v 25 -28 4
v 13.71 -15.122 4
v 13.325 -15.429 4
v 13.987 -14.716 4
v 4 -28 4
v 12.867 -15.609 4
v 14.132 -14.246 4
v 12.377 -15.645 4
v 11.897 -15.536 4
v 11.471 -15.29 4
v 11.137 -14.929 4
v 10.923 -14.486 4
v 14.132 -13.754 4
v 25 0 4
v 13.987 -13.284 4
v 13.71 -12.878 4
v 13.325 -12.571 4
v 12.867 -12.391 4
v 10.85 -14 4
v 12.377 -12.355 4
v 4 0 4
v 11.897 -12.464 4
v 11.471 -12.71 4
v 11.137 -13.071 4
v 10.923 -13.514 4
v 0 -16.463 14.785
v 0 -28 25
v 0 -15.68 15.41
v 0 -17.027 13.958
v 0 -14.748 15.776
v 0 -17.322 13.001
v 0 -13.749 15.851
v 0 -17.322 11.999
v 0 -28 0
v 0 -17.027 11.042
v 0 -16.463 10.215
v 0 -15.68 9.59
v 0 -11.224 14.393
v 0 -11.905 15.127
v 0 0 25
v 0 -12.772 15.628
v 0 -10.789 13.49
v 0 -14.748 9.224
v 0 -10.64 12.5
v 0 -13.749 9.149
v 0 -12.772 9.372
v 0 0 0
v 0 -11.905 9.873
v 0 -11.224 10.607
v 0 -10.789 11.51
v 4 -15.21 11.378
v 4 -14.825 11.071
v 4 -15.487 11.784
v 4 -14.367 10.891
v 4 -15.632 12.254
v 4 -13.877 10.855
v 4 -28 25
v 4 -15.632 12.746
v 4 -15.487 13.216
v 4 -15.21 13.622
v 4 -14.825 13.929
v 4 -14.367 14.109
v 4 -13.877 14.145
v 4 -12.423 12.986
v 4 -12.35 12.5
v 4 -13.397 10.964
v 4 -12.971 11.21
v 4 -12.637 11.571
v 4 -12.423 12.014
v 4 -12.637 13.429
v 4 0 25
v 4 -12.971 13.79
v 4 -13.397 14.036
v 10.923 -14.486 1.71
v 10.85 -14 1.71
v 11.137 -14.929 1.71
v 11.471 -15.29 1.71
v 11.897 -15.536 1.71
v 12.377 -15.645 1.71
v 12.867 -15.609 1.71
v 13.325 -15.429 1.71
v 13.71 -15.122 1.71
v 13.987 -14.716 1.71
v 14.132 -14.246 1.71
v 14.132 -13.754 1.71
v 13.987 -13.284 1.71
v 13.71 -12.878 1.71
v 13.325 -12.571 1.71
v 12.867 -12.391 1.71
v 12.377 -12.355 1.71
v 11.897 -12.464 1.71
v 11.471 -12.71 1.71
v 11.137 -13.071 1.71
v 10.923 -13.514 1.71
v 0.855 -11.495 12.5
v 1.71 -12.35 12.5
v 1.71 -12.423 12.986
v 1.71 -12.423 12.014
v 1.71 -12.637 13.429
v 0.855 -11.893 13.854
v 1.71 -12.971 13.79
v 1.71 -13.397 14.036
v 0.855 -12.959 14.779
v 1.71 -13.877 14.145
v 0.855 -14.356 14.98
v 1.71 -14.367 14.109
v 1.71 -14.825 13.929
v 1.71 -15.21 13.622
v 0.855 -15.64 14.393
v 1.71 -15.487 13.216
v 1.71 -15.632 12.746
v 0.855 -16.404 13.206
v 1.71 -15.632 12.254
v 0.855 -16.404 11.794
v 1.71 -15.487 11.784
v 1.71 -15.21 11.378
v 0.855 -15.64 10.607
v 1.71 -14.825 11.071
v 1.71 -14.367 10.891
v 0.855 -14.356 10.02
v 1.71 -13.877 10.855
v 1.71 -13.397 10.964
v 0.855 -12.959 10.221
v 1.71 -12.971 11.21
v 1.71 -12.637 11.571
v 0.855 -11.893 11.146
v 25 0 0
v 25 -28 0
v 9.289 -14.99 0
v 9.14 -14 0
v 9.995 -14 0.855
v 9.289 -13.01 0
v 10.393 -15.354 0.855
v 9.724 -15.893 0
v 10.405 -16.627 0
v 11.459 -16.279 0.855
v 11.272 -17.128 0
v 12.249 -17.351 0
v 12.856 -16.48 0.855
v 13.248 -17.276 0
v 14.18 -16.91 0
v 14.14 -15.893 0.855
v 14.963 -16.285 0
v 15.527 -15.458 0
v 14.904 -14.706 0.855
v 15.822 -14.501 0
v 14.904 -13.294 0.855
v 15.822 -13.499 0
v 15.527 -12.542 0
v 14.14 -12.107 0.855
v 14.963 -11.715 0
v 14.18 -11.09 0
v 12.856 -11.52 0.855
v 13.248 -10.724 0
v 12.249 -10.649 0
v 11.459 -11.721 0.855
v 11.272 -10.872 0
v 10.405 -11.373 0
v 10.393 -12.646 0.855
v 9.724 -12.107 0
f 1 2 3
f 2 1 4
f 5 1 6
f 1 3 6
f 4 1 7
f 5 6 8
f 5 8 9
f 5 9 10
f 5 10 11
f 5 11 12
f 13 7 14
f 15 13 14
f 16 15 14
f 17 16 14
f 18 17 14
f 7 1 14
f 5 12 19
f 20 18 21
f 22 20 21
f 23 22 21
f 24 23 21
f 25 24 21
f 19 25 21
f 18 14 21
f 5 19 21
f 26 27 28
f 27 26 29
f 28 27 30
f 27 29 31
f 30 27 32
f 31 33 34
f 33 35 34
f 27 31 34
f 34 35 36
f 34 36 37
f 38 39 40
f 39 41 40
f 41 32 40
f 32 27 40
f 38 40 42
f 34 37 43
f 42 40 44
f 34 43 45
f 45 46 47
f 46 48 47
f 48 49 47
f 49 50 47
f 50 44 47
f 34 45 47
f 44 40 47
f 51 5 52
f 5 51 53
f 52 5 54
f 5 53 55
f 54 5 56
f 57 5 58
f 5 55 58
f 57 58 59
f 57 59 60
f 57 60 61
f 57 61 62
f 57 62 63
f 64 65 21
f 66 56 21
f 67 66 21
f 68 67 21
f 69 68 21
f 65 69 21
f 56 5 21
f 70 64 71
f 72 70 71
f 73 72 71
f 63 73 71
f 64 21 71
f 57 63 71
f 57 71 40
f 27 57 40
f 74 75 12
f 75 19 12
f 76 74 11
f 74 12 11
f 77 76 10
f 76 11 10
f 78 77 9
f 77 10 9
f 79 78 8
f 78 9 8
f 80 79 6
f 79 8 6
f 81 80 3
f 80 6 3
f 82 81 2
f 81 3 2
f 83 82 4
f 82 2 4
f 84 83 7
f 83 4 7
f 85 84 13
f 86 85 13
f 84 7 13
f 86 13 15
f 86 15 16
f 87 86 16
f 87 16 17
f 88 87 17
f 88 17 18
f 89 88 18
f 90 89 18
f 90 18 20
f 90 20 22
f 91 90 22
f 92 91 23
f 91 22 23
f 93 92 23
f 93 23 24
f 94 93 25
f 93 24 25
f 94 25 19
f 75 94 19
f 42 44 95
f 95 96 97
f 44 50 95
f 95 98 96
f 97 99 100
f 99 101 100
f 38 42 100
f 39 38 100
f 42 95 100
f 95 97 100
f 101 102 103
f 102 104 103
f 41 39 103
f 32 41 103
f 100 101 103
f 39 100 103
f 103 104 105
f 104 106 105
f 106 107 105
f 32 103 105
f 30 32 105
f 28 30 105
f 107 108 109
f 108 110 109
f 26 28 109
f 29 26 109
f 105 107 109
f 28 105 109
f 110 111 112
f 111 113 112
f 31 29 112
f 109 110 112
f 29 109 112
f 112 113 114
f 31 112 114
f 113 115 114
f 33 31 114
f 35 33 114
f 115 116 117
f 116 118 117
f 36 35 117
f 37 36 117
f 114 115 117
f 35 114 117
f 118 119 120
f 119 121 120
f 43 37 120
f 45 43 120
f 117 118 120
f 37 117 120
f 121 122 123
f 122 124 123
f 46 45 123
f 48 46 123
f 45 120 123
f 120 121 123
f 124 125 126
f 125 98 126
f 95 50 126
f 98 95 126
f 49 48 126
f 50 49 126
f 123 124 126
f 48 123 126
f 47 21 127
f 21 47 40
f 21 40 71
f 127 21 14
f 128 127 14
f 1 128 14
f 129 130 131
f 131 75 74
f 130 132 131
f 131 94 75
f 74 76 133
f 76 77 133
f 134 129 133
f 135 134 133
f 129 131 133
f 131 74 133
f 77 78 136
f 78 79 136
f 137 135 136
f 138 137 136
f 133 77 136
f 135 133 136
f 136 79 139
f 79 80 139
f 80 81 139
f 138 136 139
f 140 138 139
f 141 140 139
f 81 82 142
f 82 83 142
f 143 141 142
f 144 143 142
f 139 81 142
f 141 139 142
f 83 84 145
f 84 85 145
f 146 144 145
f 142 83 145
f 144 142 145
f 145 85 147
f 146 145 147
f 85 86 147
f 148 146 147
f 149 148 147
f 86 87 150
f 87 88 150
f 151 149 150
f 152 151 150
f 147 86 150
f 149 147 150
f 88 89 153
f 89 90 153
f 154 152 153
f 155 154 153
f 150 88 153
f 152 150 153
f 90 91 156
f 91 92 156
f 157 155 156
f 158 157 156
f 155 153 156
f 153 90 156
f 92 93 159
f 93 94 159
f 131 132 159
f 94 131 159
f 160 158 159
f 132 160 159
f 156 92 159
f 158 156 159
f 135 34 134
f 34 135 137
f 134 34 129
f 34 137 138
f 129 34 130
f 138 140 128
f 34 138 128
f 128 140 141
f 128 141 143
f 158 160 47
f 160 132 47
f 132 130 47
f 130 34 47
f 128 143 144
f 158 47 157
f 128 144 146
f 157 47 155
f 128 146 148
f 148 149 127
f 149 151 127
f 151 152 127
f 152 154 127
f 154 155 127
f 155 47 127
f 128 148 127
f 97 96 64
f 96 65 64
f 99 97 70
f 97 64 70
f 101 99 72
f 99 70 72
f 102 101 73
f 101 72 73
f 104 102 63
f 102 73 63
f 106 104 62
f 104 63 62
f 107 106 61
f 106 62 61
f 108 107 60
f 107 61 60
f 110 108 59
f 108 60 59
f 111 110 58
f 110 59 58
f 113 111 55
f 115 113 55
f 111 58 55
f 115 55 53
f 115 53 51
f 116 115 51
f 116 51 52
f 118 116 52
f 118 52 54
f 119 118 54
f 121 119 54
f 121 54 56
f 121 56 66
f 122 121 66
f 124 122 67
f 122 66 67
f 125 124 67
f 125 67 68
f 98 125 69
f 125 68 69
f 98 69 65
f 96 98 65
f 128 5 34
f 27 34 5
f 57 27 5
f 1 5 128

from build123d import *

# Parameters (mm, degrees)
F1_DEPTH       = 28
F3_D           = 3.3
F3_DEPTH       = 40
F3_CSINK_D     = 6.72
F3_CSINK_ANGLE = 90
F3_TIP         = 0.9914200214
F5_D           = 3.3
F5_DEPTH       = 40
F5_CSINK_D     = 6.72
F5_CSINK_ANGLE = 90
F5_TIP         = 0.9914200214


with BuildPart() as f1:
    # F0 (on Front) → F1 (new body)
    with BuildSketch(Plane.XZ):
        Polygon((0, 4), (0, 0), (4, 0), (25, 0), (25, 4), (4, 4), (4, 25), (0, 25), align=None)
    extrude(amount=F1_DEPTH)

    # F3
    with Locations(Plane(origin=(0, 0, 0), x_dir=(0, -1, 0), z_dir=(-1, 0, 0))):
        with Locations((14, 12.5)):
            CounterSinkHole(F3_D / 2, F3_CSINK_D / 2, depth=F3_DEPTH, counter_sink_angle=F3_CSINK_ANGLE)
            with Locations((0, 0, -(F3_DEPTH + F3_TIP / 2))):  # 118° drill point
                Cone(0, F3_D / 2, F3_TIP, mode=Mode.SUBTRACT)

    # F5
    with Locations(Plane(origin=(0, 0, 0), x_dir=(1, 0, 0), z_dir=(0, 0, -1))):
        with Locations((12.5, 14)):
            CounterSinkHole(F5_D / 2, F5_CSINK_D / 2, depth=F5_DEPTH, counter_sink_angle=F5_CSINK_ANGLE)
            with Locations((0, 0, -(F5_DEPTH + F5_TIP / 2))):  # 118° drill point
                Cone(0, F5_D / 2, F5_TIP, mode=Mode.SUBTRACT)


solid = f1.part
